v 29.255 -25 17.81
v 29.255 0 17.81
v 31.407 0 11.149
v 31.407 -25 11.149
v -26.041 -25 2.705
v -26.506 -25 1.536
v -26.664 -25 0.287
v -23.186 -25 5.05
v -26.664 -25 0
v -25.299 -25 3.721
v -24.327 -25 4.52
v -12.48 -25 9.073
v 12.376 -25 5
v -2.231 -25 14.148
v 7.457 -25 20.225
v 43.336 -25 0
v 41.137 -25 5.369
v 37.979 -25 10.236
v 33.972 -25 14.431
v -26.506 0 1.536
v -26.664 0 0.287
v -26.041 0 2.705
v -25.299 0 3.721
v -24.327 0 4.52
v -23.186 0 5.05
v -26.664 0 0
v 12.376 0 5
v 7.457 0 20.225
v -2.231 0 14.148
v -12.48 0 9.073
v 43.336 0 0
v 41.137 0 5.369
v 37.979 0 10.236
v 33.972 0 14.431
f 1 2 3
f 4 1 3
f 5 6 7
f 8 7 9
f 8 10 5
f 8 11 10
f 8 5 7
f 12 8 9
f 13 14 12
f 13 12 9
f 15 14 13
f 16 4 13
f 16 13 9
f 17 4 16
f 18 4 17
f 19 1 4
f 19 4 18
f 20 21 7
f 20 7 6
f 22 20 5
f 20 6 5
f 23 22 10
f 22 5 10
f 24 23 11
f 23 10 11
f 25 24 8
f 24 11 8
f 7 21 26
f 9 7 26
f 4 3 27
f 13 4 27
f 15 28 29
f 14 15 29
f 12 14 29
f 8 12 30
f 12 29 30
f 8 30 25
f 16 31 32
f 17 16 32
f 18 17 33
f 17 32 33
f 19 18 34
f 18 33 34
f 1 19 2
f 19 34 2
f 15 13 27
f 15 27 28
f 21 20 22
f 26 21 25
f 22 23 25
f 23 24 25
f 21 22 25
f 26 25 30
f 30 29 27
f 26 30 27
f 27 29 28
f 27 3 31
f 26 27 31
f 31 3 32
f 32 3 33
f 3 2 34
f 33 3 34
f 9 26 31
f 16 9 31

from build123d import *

# Parameters (mm, degrees)
F1_DEPTH = 25
F2_R     = 5


with BuildPart() as f1:
    # F0 (on Front) → F1 (new body)
    with BuildSketch(Plane.XZ):
        with BuildLine():
            Line((-26.664281, 4), (-26.664281, 0))
            Line((-26.664281, 0), (43.335719, 0))
            ThreePointArc((43.335719, 0), (37.978653, 10.23556), (29.255193, 17.809602))
            Line((29.255193, 17.809602), (31.407206, 11.148608))
            Line((31.407206, 11.148608), (12.375794, 5))
            Line((12.375794, 5), (7.456908, 20.225129))
            ThreePointArc((7.456908, 20.225129), (-8.926448, 10.688342), (-26.664281, 4))
        make_face()
    extrude(amount=F1_DEPTH)

    # F2
    f2_edges = [f1.edges().sort_by_distance(p)[0] for p in [
        (-26.664281, -12.5, 4),
    ]]
    fillet(f2_edges, radius=F2_R)


solid = f1.part
